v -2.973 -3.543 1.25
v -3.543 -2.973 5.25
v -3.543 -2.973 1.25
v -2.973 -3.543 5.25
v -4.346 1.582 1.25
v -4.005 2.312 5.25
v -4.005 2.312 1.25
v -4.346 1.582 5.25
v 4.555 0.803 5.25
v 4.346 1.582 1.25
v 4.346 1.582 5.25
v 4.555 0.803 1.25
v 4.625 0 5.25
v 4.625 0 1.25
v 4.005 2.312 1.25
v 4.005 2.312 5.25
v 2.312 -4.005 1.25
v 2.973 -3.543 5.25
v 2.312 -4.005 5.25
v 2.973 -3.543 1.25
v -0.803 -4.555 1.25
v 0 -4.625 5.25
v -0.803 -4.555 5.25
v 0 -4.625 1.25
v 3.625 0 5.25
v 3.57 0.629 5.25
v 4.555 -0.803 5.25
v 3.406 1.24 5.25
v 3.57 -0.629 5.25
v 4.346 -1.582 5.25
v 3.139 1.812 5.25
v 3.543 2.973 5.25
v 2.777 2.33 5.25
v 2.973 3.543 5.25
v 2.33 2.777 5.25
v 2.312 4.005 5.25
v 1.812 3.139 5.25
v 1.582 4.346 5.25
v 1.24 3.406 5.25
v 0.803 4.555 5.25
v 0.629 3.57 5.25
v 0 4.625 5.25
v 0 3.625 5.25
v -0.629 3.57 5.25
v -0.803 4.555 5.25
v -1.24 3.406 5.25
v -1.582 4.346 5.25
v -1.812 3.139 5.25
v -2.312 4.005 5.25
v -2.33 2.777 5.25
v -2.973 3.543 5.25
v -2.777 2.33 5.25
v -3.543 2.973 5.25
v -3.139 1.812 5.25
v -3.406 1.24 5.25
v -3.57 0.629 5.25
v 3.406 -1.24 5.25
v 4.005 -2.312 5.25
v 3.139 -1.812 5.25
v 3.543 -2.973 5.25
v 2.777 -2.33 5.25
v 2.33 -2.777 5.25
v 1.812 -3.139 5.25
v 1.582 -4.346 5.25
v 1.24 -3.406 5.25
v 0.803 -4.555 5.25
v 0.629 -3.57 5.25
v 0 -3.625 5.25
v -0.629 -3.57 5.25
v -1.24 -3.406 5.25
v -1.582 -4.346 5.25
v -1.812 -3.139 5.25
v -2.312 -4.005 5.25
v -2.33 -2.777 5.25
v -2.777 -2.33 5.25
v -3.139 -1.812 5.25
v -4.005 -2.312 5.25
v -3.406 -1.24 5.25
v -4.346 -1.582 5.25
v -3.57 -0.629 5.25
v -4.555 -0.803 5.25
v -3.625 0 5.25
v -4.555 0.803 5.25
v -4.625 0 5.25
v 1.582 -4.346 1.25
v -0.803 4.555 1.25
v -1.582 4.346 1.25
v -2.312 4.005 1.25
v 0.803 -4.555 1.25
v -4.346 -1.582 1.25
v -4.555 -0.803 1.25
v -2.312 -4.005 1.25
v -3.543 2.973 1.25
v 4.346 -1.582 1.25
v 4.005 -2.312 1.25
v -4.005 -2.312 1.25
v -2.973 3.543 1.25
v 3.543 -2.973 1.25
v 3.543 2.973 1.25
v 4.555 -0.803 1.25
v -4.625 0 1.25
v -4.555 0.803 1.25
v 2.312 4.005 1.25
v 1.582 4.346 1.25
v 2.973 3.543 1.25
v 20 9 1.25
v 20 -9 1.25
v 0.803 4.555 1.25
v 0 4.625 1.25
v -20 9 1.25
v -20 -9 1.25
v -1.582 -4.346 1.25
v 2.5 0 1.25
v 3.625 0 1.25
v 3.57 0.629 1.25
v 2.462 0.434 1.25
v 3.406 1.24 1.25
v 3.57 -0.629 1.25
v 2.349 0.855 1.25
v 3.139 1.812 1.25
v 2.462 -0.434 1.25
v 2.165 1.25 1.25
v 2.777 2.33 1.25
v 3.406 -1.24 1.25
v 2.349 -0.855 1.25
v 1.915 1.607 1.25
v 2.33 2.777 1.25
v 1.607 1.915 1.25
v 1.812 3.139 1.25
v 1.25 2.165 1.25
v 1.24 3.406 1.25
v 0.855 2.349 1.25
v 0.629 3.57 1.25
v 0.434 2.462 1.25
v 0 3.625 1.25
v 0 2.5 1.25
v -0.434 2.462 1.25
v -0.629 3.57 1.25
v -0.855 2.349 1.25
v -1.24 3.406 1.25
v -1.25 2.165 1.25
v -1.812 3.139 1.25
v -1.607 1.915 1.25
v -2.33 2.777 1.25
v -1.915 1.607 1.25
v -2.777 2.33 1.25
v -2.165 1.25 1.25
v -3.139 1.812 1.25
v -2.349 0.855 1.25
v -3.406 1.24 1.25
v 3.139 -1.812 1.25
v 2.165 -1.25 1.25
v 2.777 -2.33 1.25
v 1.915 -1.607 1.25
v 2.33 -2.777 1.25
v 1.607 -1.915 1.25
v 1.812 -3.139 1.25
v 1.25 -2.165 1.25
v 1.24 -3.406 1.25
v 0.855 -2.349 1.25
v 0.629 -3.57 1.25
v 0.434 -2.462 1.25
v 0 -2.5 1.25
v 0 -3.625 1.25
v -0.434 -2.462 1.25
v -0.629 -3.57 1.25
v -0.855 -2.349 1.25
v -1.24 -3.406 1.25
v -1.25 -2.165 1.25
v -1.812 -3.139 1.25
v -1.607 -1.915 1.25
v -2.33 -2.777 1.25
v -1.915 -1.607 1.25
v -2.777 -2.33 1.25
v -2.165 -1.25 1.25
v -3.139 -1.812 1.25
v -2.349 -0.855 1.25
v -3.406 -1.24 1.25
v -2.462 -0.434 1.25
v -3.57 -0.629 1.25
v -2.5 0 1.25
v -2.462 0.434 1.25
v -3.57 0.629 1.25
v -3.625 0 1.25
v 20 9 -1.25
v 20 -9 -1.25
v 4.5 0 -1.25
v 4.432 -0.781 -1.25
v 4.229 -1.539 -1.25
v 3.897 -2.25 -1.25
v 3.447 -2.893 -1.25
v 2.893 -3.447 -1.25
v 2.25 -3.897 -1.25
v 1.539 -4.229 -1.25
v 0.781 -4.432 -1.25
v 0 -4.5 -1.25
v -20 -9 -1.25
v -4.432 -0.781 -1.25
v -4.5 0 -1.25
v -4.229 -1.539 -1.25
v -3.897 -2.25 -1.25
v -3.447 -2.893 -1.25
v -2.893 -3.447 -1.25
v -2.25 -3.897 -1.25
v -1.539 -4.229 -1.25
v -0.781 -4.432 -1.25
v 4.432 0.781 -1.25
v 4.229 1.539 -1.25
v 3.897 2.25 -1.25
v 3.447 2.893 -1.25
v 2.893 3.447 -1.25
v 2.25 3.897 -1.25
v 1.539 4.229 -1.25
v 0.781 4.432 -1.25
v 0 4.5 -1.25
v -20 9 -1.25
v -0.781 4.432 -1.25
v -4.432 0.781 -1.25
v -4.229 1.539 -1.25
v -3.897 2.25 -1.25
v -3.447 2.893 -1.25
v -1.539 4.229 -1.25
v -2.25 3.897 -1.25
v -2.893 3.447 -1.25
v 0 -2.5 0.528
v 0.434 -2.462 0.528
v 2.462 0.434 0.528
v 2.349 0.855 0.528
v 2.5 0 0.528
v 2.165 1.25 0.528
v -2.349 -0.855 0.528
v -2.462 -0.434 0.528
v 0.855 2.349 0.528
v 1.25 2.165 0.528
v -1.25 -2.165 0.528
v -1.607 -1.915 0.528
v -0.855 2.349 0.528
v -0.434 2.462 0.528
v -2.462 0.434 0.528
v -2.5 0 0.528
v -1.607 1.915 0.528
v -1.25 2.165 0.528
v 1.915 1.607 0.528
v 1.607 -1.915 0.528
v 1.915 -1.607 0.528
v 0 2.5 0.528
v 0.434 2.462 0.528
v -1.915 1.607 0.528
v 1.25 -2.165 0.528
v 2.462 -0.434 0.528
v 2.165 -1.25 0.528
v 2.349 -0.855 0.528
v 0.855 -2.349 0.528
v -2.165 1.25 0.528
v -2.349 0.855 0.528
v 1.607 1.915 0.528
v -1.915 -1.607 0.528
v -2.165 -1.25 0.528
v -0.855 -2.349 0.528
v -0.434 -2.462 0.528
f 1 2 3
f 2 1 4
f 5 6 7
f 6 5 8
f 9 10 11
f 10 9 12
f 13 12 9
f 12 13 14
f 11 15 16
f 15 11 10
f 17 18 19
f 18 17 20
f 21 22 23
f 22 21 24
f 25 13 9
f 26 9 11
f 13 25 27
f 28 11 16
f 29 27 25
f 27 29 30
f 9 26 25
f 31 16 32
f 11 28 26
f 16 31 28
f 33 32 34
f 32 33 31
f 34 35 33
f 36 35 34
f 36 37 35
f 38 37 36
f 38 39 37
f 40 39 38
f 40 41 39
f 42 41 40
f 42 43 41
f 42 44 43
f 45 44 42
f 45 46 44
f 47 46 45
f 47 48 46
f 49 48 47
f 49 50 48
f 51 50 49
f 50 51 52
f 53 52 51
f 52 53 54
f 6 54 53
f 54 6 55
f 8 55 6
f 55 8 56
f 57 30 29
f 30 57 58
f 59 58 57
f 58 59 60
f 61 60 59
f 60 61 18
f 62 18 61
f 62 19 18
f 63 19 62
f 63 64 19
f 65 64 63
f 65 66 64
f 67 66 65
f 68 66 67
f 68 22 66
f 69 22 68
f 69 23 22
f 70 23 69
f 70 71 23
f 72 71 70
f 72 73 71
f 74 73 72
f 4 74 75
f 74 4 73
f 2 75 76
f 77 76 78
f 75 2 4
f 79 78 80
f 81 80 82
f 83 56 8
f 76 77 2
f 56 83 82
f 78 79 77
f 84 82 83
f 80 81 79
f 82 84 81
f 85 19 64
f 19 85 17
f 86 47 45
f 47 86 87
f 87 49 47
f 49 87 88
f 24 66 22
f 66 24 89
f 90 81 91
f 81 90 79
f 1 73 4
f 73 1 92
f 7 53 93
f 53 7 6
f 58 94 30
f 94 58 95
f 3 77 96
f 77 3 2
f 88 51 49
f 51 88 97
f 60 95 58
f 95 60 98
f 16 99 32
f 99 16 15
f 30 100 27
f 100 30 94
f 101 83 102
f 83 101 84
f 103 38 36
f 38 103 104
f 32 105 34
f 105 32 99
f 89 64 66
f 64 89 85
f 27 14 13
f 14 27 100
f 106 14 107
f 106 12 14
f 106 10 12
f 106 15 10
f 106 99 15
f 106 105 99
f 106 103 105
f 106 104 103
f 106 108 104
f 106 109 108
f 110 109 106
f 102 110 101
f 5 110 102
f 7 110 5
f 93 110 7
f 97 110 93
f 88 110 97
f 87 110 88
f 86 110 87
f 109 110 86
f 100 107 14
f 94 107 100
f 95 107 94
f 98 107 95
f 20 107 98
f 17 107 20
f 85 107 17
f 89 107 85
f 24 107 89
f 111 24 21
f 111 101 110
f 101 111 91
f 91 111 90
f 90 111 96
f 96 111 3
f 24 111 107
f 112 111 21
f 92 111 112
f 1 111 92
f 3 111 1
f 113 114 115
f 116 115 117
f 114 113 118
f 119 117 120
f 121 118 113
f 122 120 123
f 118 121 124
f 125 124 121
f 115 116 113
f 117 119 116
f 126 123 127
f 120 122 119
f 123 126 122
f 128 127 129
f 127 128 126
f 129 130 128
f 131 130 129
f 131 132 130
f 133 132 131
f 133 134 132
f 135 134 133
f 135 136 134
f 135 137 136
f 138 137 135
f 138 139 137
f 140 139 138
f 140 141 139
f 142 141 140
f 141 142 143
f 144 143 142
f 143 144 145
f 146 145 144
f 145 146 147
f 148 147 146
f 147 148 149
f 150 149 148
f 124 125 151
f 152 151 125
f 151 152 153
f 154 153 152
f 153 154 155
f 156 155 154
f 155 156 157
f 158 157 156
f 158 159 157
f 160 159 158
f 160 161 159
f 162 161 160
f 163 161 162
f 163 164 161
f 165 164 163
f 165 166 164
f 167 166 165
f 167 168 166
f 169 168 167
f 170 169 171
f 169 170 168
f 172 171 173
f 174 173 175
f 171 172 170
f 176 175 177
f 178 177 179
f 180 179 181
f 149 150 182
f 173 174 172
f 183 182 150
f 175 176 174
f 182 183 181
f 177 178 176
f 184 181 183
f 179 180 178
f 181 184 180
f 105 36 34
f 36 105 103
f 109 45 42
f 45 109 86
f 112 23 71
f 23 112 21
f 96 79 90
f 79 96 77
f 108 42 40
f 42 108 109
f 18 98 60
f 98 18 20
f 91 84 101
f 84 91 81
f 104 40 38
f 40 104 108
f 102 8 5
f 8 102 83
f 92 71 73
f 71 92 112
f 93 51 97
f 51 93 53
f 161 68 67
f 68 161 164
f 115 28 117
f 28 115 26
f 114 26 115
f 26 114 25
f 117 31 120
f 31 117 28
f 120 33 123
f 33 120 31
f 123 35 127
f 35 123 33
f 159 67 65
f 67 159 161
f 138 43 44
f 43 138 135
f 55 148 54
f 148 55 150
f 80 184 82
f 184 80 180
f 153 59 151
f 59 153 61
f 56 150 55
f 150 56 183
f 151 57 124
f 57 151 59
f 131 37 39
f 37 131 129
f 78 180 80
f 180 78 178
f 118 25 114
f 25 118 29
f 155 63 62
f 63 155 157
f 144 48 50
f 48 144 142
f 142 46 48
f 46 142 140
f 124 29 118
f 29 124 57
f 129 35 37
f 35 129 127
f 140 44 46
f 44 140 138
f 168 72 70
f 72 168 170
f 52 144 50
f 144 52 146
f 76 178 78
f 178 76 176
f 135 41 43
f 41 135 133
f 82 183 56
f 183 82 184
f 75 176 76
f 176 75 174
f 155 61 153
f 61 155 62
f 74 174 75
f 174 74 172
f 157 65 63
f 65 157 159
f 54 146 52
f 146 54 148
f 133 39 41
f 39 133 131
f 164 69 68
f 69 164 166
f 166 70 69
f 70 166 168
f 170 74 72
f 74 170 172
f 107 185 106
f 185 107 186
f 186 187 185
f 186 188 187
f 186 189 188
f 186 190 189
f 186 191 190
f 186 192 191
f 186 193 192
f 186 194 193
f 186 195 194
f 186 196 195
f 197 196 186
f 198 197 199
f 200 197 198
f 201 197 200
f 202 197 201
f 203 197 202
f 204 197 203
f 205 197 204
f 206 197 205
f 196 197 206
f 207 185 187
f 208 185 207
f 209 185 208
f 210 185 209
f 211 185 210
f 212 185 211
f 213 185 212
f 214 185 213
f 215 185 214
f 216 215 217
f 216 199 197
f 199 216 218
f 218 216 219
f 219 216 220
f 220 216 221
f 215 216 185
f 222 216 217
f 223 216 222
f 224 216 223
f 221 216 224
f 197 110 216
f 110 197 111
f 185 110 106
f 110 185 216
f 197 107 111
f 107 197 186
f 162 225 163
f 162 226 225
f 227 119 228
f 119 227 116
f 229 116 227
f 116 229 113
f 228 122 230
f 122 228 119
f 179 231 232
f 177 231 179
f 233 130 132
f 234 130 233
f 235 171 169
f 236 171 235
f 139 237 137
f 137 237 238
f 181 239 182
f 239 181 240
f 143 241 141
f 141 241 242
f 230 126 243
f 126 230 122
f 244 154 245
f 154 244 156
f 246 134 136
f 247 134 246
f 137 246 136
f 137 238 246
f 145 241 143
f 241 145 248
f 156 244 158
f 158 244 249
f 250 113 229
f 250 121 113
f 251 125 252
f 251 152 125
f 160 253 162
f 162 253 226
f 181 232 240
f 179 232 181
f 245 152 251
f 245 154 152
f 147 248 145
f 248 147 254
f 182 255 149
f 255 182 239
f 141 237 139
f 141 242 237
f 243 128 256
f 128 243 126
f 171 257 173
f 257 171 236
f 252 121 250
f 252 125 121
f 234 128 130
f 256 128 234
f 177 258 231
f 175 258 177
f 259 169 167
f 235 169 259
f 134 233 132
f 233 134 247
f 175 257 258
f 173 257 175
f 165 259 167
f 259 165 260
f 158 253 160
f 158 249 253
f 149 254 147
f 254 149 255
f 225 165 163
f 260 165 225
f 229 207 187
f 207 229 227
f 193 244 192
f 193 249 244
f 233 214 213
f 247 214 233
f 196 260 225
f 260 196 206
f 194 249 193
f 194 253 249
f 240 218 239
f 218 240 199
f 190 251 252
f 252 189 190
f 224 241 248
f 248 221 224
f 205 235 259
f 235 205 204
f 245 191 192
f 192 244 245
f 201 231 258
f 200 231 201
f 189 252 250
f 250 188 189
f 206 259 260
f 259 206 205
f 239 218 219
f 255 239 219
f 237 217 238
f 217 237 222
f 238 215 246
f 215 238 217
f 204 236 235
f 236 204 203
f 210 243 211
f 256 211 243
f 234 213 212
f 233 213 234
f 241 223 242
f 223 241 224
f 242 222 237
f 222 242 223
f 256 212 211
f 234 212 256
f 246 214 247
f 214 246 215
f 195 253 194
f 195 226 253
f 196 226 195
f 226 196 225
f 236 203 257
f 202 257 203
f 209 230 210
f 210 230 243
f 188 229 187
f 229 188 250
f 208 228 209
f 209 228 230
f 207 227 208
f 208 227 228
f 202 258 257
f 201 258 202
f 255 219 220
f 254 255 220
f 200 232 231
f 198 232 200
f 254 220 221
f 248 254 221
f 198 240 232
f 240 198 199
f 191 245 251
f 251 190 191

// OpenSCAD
basex = 40;
basez  = 2.5;
basey  = 18;

// 7.25

sleeved  = 7.25;
sleeveh  = 4;

screwshaft = 5;
//screwshaft = 3.75;
screwheadw = 9;
screwheadh = 4;

difference () {
  union() {
    cube([basex, basey, basez], center=true);

    translate([0, 0, (basez + sleeveh)/2]) {
      difference () {
        cylinder(h=sleeveh, d=sleeved+2, $fn = 36, center = true);
        cylinder(h=sleeveh, d=sleeved, $fn = 36,  center=true);
      }
    }
  }
  
  union () {
    // screw shaft
    cylinder(h = (basez+sleeveh)*2, d = screwshaft, $fn = 36, center=true);
    //screw head
    translate([0,0, ((screwheadh/2) - (basez/2))]) {
      #cylinder(d1 = screwheadw, d2 = 0, h = screwheadh, $fn = 36, center=true);
    }
  }
}  
